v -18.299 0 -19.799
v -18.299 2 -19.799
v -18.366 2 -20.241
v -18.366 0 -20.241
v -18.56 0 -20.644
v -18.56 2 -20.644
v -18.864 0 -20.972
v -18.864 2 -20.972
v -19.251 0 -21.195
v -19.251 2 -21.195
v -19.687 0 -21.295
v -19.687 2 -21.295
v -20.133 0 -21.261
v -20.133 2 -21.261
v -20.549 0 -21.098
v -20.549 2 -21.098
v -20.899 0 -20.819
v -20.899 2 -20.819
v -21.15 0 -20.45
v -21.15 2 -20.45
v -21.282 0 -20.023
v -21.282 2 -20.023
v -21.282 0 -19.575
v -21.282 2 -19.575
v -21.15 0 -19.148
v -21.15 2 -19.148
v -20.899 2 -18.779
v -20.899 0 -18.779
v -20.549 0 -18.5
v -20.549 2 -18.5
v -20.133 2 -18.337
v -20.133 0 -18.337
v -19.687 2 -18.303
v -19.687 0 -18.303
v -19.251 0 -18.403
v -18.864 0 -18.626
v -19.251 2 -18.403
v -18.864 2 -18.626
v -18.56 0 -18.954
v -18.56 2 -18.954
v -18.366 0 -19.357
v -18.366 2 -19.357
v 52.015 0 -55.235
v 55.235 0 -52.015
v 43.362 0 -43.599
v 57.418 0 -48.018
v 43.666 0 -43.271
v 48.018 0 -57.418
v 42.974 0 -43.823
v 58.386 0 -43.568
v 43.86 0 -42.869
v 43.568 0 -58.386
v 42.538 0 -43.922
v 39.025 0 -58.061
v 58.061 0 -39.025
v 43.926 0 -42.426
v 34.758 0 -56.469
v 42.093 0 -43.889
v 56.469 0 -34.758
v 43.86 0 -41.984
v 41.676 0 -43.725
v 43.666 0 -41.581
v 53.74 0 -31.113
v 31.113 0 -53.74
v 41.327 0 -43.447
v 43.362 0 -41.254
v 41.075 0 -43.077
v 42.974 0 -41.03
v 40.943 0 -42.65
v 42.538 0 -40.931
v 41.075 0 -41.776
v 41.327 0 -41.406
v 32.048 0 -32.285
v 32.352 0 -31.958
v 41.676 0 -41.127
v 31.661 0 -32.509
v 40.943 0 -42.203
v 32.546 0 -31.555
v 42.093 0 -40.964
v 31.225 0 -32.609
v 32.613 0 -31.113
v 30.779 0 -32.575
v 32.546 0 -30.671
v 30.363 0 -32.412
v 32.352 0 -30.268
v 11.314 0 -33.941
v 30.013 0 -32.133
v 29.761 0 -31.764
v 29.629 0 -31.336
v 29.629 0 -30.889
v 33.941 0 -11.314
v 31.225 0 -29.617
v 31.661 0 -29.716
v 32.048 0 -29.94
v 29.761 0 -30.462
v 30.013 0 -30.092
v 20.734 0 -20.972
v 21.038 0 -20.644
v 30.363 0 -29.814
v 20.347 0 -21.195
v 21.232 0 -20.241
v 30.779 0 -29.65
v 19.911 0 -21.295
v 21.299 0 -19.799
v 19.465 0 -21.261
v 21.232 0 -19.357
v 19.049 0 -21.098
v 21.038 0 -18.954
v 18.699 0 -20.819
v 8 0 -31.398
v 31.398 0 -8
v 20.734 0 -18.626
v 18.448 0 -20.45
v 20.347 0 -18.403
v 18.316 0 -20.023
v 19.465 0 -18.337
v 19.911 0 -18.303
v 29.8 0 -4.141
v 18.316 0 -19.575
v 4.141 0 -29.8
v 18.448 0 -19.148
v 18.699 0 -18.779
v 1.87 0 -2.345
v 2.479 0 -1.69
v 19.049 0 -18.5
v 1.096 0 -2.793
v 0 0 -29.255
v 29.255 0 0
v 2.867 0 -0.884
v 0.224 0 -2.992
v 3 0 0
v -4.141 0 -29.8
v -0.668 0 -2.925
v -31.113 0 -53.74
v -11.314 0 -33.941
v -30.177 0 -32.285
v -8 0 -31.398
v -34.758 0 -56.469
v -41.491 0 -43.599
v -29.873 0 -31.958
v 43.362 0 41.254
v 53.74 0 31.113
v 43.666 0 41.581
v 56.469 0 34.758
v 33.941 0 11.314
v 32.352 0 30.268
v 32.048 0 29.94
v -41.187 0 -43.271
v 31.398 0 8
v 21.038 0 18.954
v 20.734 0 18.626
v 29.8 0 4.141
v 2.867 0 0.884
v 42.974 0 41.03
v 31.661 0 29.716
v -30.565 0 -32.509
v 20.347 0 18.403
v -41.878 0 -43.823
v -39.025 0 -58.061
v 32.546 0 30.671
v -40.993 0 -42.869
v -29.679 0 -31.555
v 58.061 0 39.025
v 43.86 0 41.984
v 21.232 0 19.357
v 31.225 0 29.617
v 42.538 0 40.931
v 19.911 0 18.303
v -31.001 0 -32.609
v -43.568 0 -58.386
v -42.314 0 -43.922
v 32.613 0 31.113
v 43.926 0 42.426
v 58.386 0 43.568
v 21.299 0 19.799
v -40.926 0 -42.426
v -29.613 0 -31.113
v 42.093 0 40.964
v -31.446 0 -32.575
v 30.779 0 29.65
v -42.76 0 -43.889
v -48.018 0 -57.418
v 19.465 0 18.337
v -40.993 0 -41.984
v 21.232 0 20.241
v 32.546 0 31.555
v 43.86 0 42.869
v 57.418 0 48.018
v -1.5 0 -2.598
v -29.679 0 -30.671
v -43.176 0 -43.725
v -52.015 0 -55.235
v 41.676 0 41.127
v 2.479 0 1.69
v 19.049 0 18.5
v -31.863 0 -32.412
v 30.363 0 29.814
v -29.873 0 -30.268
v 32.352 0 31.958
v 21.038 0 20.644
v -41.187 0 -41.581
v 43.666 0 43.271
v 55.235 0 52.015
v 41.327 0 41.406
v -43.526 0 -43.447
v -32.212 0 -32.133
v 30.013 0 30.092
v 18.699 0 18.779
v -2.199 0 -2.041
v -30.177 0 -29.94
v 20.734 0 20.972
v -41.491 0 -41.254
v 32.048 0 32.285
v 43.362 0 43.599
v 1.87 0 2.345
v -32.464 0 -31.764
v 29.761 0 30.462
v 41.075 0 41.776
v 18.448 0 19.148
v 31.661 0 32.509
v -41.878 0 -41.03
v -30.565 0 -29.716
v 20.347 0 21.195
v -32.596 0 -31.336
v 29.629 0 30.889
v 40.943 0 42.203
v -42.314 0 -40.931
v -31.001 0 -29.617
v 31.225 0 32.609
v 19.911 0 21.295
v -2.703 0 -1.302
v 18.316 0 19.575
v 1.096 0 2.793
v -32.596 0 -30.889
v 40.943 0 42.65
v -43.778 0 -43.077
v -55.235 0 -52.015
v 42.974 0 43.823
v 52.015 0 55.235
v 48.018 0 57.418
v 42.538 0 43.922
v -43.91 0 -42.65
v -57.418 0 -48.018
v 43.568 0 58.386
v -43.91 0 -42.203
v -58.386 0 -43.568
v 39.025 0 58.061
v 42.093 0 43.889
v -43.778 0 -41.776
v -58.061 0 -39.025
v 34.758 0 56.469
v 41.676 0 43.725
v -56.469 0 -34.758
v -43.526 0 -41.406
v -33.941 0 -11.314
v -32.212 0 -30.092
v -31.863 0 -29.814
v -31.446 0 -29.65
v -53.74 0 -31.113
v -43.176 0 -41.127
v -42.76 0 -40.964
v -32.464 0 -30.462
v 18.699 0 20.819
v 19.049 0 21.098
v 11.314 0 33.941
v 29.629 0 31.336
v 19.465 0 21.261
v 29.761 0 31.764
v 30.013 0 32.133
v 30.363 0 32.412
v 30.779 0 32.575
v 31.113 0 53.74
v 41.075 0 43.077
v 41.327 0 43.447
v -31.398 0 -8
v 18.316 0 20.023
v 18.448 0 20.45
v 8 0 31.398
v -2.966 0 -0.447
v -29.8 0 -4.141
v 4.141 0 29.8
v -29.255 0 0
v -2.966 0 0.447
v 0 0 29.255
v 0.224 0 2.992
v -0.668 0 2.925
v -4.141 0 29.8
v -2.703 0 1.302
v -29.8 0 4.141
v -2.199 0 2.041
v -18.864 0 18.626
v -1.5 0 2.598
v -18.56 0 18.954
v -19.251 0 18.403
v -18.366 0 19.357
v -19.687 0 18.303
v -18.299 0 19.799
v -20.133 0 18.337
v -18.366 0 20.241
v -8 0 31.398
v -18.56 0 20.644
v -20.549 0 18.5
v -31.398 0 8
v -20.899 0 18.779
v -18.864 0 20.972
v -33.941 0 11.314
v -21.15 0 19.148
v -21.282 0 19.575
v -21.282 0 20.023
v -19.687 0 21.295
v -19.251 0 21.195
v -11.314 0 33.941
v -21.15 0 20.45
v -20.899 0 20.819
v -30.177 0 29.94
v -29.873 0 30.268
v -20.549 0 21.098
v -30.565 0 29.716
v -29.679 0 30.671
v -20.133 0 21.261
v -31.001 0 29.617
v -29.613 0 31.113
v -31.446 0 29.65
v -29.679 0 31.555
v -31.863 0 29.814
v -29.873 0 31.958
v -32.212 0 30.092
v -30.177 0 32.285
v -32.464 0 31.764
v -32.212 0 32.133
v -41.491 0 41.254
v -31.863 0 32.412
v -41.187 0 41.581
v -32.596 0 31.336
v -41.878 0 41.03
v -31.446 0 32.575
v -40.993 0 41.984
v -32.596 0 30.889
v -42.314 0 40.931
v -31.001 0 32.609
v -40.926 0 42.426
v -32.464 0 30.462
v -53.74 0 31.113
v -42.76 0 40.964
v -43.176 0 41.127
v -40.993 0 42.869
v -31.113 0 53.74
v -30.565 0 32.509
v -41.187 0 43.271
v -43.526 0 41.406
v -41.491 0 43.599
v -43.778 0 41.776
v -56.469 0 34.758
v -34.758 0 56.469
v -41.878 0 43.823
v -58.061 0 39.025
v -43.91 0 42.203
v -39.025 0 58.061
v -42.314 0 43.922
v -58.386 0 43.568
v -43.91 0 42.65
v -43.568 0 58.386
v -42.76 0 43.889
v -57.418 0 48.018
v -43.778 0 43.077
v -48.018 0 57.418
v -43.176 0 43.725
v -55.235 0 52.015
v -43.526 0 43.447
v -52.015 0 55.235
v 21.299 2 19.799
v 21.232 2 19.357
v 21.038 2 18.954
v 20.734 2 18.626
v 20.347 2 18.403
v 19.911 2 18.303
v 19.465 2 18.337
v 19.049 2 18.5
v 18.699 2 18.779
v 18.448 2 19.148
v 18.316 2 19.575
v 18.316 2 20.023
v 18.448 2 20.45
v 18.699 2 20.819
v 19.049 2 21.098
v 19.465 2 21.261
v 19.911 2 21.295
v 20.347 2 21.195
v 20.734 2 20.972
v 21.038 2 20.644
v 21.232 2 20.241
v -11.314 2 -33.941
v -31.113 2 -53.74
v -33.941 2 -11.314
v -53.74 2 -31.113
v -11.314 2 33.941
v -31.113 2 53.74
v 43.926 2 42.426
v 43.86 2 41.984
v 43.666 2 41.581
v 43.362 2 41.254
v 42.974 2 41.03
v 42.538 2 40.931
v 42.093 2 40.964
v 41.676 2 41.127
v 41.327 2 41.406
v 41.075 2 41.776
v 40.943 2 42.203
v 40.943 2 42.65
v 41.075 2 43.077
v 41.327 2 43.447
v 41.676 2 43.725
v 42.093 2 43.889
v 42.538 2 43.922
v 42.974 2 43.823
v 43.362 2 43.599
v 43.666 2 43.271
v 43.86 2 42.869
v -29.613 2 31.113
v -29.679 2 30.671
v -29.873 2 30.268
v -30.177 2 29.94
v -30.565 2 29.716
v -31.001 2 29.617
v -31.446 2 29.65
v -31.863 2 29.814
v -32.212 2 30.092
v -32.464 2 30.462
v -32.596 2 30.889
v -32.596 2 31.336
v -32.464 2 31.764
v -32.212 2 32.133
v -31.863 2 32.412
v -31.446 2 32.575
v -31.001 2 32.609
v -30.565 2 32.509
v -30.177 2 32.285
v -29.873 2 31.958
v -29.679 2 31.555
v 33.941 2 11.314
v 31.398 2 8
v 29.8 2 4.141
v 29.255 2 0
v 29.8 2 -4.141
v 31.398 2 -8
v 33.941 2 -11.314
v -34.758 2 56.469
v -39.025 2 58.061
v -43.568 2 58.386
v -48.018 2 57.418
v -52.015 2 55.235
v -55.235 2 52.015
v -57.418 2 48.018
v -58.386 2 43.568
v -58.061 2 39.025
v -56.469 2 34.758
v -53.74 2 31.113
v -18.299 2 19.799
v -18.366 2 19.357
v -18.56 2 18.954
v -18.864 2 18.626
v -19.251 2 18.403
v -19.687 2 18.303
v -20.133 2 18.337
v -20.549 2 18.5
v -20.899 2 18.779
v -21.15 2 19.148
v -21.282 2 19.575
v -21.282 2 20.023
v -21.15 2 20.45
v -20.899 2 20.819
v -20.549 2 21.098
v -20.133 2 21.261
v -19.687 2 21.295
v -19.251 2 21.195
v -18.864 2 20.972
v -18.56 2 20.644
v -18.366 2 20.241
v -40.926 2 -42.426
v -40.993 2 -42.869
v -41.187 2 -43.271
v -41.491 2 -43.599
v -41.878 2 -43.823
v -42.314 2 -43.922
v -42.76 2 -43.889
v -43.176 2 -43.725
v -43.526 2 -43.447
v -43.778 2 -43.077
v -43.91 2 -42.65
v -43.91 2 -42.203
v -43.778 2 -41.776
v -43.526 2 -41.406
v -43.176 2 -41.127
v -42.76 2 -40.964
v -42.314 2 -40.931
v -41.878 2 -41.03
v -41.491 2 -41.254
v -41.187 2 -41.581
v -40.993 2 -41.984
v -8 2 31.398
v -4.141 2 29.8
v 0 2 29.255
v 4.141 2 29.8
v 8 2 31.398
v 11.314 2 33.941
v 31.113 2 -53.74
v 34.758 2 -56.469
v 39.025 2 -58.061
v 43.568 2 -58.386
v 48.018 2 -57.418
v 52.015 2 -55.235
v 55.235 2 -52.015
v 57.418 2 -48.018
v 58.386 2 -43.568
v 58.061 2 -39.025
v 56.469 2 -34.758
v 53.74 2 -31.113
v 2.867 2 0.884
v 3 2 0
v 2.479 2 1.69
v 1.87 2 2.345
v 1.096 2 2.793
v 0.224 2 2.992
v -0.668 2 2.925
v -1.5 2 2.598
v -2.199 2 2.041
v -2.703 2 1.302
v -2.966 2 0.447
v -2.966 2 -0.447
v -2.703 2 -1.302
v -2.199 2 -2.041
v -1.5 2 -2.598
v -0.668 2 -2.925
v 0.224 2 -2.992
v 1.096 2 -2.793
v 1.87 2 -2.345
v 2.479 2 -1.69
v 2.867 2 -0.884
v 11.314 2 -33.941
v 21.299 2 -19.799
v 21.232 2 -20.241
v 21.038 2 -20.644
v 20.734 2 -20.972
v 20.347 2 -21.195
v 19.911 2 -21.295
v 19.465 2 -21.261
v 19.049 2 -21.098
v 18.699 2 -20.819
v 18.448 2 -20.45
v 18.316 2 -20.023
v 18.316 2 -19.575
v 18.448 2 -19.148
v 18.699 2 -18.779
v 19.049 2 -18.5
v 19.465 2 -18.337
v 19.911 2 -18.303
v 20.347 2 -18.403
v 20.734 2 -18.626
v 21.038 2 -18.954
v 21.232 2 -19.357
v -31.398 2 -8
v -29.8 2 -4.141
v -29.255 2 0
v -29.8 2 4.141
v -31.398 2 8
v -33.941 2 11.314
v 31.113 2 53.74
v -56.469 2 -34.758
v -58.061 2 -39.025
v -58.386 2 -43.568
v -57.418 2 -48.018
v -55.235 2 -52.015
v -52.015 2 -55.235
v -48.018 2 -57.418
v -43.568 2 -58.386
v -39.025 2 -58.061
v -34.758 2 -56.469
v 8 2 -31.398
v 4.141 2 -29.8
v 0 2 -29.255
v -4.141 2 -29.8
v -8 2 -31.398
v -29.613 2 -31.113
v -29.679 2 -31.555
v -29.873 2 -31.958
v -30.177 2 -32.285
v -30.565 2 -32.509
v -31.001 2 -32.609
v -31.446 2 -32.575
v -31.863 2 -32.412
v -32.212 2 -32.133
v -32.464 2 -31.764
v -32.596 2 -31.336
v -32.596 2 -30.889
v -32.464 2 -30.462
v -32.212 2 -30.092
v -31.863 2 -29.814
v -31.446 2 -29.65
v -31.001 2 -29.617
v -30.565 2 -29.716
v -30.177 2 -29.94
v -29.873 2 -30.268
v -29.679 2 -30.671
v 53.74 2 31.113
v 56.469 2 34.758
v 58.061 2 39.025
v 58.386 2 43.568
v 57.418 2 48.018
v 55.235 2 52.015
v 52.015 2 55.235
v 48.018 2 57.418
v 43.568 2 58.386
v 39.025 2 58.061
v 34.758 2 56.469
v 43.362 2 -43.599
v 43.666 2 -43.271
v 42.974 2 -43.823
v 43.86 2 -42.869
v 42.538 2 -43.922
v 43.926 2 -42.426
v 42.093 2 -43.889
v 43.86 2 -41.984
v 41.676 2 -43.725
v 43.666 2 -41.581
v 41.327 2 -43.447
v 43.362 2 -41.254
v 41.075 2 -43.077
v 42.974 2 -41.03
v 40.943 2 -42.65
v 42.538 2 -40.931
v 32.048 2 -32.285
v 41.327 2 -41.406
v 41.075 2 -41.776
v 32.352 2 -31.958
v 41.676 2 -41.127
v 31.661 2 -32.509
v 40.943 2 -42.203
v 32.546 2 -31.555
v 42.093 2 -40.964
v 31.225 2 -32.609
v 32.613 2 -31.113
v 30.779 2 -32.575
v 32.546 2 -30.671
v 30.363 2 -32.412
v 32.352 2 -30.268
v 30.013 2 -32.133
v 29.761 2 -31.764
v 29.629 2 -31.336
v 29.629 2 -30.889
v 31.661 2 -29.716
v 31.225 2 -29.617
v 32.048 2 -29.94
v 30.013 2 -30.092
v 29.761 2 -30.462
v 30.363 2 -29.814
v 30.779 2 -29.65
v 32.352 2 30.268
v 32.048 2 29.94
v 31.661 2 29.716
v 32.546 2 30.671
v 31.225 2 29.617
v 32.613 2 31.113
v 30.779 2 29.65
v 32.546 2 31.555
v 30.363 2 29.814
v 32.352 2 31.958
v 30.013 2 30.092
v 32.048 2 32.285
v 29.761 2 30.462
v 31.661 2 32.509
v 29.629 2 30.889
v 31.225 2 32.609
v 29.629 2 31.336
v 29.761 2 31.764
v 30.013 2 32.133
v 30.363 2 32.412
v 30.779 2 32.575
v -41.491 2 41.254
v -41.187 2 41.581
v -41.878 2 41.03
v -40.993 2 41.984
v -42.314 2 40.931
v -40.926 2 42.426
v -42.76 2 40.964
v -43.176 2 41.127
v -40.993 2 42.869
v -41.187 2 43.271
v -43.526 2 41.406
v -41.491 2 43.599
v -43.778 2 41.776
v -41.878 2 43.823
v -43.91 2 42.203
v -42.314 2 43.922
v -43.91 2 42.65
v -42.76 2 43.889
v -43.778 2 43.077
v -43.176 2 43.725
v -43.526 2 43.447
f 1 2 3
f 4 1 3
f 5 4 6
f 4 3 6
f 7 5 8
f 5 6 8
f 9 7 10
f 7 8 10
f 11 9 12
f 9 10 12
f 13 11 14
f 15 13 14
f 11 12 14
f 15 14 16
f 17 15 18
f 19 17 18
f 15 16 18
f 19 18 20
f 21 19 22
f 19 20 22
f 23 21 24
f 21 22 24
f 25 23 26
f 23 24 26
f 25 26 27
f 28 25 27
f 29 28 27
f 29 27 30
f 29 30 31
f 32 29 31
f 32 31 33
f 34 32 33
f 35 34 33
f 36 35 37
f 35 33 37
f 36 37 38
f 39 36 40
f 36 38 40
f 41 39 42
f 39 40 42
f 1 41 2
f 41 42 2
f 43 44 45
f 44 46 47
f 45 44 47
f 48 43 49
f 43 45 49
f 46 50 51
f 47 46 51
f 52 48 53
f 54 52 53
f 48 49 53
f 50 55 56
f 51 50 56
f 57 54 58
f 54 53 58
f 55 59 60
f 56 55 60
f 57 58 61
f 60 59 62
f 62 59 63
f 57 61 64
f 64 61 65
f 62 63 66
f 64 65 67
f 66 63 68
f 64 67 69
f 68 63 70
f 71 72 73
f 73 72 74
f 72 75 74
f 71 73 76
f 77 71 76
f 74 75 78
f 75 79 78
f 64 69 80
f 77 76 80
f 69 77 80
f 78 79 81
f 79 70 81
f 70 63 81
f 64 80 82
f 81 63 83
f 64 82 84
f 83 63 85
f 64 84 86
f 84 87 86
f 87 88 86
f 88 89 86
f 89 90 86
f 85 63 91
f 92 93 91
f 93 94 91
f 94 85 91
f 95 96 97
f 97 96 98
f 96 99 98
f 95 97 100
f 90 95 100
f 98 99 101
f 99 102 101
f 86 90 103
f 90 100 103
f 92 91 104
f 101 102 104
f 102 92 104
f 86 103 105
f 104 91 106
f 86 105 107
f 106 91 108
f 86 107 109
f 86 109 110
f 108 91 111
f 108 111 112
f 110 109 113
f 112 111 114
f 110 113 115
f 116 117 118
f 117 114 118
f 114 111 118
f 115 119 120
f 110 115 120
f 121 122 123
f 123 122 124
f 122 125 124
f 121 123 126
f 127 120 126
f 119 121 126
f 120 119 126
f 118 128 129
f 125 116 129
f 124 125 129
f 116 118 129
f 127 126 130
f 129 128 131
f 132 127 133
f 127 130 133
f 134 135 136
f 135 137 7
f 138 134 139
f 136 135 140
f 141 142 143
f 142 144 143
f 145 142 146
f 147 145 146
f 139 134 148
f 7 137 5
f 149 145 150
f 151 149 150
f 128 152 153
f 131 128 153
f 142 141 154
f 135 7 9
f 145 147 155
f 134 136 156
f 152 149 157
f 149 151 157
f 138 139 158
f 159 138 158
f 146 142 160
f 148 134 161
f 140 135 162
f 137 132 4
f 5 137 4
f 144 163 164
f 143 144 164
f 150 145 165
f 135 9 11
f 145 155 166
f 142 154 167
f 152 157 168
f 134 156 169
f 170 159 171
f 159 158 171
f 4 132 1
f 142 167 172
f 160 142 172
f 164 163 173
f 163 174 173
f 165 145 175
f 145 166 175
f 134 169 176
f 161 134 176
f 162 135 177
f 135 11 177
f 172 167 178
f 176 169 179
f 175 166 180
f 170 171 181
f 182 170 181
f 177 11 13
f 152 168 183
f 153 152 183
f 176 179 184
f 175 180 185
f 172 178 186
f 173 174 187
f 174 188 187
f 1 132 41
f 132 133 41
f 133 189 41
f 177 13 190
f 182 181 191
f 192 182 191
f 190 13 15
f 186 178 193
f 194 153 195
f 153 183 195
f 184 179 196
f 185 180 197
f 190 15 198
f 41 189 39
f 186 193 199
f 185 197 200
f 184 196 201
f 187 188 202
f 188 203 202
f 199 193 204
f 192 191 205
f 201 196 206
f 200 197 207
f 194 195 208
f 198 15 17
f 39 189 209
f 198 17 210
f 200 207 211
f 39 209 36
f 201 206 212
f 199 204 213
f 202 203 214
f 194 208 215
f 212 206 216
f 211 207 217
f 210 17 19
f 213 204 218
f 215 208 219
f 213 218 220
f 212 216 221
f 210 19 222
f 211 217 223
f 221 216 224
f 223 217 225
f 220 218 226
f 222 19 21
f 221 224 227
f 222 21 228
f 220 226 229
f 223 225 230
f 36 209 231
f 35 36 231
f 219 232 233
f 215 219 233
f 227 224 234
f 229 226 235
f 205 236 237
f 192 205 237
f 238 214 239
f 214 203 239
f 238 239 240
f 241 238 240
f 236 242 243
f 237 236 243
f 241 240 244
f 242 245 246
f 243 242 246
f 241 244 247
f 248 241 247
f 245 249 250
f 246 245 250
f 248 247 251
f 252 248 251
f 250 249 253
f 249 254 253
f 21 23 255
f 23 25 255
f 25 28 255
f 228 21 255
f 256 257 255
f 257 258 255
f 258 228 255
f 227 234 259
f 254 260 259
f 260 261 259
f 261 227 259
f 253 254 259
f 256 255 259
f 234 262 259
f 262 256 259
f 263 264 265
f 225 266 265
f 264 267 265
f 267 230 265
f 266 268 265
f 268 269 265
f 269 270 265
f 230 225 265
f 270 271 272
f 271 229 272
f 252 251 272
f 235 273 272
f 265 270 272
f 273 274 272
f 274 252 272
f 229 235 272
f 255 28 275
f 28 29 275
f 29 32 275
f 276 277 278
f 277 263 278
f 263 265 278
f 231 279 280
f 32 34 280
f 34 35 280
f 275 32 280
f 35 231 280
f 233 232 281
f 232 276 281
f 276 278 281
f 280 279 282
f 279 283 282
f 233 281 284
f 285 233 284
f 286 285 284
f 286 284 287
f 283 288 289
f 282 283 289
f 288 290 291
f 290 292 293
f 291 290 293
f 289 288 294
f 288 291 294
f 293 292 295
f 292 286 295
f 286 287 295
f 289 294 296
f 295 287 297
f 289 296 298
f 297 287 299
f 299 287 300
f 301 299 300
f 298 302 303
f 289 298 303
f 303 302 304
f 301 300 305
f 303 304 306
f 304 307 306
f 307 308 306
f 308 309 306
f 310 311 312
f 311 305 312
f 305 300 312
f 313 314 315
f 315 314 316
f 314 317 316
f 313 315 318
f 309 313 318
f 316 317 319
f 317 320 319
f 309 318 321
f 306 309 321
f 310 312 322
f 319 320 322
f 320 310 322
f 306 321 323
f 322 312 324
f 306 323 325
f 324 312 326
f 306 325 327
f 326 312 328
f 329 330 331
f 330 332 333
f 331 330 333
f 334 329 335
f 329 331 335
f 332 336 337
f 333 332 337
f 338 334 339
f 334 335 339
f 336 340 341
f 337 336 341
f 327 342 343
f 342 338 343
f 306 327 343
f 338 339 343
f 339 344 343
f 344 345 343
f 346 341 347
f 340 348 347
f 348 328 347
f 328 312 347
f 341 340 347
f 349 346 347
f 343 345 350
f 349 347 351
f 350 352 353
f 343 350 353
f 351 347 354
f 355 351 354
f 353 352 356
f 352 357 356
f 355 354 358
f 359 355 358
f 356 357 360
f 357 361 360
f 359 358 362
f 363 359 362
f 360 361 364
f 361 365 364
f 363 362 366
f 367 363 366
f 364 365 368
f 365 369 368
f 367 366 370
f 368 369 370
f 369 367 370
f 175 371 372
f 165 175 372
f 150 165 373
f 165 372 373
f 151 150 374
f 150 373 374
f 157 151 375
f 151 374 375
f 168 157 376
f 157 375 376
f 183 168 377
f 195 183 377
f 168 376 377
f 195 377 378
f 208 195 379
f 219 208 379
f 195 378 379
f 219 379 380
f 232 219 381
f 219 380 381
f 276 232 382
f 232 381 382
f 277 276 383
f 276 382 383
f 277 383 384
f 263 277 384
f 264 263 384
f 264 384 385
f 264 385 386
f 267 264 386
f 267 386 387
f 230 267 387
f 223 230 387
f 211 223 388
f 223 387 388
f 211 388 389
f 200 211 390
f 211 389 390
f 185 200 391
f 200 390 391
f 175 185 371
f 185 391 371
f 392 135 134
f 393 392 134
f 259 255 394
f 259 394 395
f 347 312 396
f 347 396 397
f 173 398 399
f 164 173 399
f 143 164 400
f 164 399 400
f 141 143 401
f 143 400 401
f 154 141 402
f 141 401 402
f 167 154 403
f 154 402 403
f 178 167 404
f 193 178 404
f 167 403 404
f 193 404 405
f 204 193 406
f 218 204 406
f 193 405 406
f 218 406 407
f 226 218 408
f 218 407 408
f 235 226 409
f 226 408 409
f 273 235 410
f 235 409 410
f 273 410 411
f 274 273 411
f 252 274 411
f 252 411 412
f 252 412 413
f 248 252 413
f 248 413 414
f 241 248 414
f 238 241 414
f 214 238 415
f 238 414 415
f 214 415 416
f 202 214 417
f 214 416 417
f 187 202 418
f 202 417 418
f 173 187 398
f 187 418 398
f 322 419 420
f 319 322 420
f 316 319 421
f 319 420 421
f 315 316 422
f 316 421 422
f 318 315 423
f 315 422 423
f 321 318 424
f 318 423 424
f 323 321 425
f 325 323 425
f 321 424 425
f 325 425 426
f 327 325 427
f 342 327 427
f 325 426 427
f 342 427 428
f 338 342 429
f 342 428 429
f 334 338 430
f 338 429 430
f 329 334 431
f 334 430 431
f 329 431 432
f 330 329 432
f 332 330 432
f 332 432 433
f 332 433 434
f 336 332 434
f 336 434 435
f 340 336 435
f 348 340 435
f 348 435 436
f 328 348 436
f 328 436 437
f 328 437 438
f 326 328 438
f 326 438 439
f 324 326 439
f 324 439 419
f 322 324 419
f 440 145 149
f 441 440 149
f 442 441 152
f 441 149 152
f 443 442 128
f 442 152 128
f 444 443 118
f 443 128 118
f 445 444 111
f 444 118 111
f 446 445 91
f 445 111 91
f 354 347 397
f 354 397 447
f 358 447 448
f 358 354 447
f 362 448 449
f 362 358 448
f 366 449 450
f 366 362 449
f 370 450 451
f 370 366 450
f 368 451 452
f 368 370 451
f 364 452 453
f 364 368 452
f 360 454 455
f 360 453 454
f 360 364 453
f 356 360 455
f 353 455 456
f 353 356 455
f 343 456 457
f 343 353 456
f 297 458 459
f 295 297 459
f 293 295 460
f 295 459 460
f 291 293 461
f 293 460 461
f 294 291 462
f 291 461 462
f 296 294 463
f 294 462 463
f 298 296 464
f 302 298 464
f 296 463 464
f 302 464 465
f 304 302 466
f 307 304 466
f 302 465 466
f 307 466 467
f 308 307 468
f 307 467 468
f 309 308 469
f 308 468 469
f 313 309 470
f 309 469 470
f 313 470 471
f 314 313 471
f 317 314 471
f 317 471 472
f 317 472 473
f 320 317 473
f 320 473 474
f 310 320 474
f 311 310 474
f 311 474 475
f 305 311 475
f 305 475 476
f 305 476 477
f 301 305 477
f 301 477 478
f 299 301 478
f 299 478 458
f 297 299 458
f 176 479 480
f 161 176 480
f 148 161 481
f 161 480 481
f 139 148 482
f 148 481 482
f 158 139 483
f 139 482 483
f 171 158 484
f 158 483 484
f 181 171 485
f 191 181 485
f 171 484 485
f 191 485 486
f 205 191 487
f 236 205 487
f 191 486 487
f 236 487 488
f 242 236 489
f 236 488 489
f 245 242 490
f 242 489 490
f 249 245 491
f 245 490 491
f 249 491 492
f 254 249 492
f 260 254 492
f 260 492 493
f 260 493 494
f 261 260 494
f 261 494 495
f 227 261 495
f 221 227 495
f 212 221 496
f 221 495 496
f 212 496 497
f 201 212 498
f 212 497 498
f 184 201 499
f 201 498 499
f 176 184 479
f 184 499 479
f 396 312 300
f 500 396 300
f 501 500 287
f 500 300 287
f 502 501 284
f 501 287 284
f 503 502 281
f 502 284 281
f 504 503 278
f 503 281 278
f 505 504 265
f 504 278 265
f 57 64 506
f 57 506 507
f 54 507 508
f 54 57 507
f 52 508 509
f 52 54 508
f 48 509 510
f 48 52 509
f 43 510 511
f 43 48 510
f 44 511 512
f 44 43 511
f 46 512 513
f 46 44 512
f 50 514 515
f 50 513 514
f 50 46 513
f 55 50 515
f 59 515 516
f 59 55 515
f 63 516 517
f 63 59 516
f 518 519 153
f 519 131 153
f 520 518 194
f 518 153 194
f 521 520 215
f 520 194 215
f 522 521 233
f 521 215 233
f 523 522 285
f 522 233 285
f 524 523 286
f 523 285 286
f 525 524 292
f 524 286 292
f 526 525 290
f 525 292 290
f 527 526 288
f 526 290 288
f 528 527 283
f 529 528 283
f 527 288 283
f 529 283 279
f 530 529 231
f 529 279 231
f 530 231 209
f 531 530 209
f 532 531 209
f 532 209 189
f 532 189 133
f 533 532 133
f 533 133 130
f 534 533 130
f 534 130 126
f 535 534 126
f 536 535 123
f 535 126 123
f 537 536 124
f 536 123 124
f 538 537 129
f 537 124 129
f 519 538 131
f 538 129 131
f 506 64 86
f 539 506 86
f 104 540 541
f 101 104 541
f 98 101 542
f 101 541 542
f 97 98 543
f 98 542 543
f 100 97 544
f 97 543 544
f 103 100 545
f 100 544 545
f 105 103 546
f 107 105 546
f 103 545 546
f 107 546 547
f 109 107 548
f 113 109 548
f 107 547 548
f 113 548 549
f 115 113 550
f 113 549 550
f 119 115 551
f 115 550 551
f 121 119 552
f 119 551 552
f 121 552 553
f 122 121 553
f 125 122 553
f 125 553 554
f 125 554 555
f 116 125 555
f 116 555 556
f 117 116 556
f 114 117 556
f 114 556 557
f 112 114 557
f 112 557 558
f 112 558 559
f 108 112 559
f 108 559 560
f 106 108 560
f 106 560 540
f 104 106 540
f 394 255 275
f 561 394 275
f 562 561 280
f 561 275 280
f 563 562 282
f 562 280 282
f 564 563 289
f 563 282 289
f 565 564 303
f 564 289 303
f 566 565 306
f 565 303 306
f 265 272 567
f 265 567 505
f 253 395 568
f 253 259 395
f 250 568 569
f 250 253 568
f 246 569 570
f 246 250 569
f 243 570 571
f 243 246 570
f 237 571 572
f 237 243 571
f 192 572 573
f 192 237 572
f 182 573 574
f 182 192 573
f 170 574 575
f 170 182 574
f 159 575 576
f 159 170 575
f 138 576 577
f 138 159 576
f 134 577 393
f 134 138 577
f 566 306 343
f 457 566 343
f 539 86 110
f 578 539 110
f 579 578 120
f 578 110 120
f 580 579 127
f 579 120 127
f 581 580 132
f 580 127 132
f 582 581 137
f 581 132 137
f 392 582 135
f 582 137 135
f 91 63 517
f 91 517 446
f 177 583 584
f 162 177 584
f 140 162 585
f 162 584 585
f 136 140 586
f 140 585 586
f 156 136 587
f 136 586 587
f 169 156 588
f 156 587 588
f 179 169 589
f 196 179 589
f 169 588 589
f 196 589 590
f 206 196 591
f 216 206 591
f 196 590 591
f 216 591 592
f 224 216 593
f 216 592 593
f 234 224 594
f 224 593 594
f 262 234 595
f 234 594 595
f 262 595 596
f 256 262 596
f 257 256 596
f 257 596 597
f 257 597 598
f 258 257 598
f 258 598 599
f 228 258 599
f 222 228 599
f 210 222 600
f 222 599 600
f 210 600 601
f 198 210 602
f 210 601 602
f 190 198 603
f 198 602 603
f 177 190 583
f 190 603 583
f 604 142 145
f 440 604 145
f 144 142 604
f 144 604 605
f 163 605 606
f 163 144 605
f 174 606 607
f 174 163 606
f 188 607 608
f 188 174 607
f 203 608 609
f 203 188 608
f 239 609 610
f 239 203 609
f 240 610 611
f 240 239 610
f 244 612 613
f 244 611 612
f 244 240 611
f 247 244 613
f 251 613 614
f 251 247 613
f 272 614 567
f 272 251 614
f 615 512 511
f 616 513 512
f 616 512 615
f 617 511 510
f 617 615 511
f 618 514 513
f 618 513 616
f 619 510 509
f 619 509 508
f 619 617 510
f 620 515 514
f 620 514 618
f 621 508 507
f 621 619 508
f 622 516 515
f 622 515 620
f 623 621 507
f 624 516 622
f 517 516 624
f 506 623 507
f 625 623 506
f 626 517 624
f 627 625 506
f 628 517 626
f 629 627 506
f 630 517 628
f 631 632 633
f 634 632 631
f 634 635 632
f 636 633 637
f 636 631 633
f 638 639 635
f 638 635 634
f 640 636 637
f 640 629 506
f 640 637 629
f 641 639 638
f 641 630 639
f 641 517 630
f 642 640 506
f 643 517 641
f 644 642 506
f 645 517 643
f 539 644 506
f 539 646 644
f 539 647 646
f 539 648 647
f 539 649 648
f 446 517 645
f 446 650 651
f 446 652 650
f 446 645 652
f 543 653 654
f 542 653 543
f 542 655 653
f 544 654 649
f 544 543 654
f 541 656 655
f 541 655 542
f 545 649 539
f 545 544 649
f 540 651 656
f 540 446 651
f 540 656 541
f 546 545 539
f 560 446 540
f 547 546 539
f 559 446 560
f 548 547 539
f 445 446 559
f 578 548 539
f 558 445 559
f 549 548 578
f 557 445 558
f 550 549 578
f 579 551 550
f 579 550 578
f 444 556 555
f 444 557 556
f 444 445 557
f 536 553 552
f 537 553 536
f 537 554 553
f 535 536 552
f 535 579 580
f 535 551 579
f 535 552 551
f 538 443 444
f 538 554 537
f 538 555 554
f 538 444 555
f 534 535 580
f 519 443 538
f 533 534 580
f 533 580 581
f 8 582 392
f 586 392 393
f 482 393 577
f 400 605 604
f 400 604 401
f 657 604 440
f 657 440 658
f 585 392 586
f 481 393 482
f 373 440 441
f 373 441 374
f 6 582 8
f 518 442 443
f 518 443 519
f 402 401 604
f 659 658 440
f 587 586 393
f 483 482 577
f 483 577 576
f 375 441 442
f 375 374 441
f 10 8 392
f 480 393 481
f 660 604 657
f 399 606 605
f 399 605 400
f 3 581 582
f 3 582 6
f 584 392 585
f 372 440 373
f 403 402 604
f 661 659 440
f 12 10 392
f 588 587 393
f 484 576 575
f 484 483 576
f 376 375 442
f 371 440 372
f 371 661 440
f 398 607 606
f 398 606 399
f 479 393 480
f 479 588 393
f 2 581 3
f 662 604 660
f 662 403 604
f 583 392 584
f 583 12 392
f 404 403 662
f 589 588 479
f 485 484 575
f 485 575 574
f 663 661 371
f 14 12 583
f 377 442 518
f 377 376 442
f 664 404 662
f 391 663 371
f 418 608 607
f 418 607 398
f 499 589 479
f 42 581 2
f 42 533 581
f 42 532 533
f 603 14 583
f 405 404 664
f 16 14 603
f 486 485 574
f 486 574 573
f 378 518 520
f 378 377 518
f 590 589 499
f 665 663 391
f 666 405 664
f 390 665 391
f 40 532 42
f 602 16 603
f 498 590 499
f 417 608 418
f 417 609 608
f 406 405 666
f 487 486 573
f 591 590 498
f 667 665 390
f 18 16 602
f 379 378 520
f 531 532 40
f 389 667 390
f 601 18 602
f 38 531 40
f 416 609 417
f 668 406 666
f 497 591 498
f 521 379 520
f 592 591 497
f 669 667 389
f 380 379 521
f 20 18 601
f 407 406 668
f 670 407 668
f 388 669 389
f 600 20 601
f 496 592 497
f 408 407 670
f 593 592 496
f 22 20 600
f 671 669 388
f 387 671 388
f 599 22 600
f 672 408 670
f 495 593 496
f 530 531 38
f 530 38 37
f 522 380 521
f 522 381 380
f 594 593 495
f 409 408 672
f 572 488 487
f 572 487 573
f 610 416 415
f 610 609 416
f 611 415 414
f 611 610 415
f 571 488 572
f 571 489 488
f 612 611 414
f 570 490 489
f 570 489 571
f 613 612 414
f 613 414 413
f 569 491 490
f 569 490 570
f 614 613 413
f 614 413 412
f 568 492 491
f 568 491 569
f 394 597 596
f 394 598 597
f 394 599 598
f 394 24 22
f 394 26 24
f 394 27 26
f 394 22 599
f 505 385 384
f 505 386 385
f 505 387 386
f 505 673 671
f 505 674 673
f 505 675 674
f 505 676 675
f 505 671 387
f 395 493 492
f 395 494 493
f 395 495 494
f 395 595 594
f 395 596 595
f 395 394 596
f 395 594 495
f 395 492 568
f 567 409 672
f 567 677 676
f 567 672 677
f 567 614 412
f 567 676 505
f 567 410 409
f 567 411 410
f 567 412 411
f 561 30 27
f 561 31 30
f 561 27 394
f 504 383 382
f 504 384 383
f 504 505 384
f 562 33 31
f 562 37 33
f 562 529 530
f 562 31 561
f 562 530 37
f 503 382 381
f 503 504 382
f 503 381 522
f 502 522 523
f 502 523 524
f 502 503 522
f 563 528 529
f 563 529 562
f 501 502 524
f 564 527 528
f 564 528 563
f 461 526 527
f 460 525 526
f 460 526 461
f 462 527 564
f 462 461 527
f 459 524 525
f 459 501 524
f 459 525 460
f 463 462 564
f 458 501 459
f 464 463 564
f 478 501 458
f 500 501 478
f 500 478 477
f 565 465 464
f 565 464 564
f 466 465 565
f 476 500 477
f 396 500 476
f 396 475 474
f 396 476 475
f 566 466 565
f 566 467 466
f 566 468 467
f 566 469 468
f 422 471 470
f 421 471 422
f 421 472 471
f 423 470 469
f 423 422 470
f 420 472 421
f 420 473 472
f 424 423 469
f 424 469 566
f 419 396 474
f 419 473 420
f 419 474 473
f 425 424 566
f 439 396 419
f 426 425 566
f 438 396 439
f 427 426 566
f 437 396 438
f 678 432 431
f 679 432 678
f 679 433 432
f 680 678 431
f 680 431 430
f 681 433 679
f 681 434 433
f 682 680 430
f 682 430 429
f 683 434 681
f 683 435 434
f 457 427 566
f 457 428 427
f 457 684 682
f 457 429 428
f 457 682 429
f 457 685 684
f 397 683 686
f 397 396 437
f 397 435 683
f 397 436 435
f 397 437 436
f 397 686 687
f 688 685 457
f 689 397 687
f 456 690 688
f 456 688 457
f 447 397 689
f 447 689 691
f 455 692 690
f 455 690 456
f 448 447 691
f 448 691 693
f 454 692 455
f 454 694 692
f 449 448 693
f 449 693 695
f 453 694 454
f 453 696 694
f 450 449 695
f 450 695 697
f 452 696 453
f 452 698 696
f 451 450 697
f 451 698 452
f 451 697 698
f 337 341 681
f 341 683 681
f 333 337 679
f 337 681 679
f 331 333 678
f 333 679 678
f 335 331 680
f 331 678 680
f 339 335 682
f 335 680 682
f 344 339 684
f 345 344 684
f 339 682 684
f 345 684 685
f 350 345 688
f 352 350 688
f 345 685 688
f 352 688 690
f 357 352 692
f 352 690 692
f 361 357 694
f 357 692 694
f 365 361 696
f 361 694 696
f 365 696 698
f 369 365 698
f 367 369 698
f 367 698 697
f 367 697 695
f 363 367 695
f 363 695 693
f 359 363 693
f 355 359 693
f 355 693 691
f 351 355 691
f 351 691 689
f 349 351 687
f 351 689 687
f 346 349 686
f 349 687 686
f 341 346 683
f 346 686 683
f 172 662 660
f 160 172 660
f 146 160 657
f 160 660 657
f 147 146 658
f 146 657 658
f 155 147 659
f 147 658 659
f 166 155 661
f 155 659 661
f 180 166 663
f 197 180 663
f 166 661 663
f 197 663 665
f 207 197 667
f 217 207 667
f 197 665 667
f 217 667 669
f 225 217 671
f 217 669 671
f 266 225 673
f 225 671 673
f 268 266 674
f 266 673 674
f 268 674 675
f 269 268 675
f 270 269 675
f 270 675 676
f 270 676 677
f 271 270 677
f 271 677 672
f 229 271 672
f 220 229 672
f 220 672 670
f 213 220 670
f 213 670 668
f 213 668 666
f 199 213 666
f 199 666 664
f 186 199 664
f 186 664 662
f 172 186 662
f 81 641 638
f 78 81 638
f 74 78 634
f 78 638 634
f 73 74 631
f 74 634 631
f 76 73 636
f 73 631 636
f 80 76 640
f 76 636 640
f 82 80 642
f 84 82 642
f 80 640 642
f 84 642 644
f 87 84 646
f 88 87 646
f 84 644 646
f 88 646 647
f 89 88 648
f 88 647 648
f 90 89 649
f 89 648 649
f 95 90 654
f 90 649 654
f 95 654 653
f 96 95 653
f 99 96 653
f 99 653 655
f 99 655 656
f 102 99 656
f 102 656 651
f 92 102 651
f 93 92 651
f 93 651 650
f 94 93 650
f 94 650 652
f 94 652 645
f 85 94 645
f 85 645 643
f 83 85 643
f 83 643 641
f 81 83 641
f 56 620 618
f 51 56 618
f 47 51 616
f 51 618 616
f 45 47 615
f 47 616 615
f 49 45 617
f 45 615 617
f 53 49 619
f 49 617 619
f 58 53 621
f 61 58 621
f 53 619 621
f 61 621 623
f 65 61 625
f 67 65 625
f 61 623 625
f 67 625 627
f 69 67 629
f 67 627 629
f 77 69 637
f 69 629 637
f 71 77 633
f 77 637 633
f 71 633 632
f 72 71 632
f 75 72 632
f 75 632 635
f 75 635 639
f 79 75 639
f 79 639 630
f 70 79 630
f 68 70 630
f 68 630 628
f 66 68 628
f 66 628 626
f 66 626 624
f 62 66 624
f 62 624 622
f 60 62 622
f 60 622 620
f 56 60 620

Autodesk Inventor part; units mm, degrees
ref_plane "YZ Plane" through (0, 0, 0) normal (1, 0, 0) x (0, 1, 0)
ref_plane "XZ Plane" through (0, 0, 0) normal (0, 1, 0) x (-1, 0, 0)
ref_plane "XY Plane" through (0, 0, 0) normal (0, 0, 1) x (1, 0, 0)
sketch "Sketch1" plane through (0, 0, 0) normal (0, 1, 0) x (-1, 0, 0)
  arc A0 (-53.7401, -31.1127) -> (-31.1127, -53.7401) centre (-42.4264, -42.4264) ccw
  arc A1 (31.1127, -53.7401) -> (53.7401, -31.1127) centre (42.4264, -42.4264) ccw
  arc A2 (53.7401, 31.1127) -> (31.1127, 53.7401) centre (42.4264, 42.4264) ccw
  arc A3 (-31.1127, 53.7401) -> (-53.7401, 31.1127) centre (-42.4264, 42.4264) ccw
  line L0 (-53.7401, 31.1127) -> (-33.9411, 11.3137)
  line L1 (11.3137, -33.9411) -> (31.1127, -53.7401)
  line L2 (-53.7401, -31.1127) -> (-33.9411, -11.3137)
  line L3 (11.3137, 33.9411) -> (31.1127, 53.7401)
  line L4 (-31.1127, 53.7401) -> (-11.3137, 33.9411)
  line L5 (33.9411, -11.3137) -> (53.7401, -31.1127)
  line L6 (-31.1127, -53.7401) -> (-11.3137, -33.9411)
  line L7 (33.9411, 11.3137) -> (53.7401, 31.1127)
  arc A4 (11.3137, -33.9411) -> (-11.3137, -33.9411) centre (0, -45.2548) ccw
  arc A5 (33.9411, 11.3137) -> (33.9411, -11.3137) centre (45.2548, 0) ccw
  arc A6 (-11.3137, 33.9411) -> (11.3137, 33.9411) centre (0, 45.2548) ccw
  arc A7 (-33.9411, -11.3137) -> (-33.9411, 11.3137) centre (-45.2548, 0) ccw
  arc A8 (-53.7401, -31.1127) -> (-31.1127, -53.7401) centre (-42.4264, -42.4264) ccw
  arc A9 (31.1127, -53.7401) -> (53.7401, -31.1127) centre (42.4264, -42.4264) ccw
  arc A10 (53.7401, 31.1127) -> (31.1127, 53.7401) centre (42.4264, 42.4264) ccw
  arc A11 (-31.1127, 53.7401) -> (-53.7401, 31.1127) centre (-42.4264, 42.4264) ccw
  line L8 (-53.7401, 31.1127) -> (-33.9411, 11.3137)
  line L9 (11.3137, -33.9411) -> (31.1127, -53.7401)
  line L10 (-53.7401, -31.1127) -> (-33.9411, -11.3137)
  line L11 (11.3137, 33.9411) -> (31.1127, 53.7401)
  line L12 (-31.1127, 53.7401) -> (-11.3137, 33.9411)
  line L13 (33.9411, -11.3137) -> (53.7401, -31.1127)
  line L14 (-31.1127, -53.7401) -> (-11.3137, -33.9411)
  line L15 (33.9411, 11.3137) -> (53.7401, 31.1127)
  arc A12 (11.3137, -33.9411) -> (-11.3137, -33.9411) centre (0, -45.2548) ccw
  arc A13 (33.9411, 11.3137) -> (33.9411, -11.3137) centre (45.2548, 0) ccw
  arc A14 (-11.3137, 33.9411) -> (11.3137, 33.9411) centre (0, 45.2548) ccw
  arc A15 (-33.9411, -11.3137) -> (-33.9411, 11.3137) centre (-45.2548, 0) ccw
  arc A16 (-53.7401, -31.1127) -> (-31.1127, -53.7401) centre (-42.4264, -42.4264) ccw
  arc A17 (31.1127, -53.7401) -> (53.7401, -31.1127) centre (42.4264, -42.4264) ccw
  arc A18 (53.7401, 31.1127) -> (31.1127, 53.7401) centre (42.4264, 42.4264) ccw
  arc A19 (-31.1127, 53.7401) -> (-53.7401, 31.1127) centre (-42.4264, 42.4264) ccw
  line L16 (-53.7401, 31.1127) -> (-33.9411, 11.3137)
  line L17 (11.3137, -33.9411) -> (31.1127, -53.7401)
  line L18 (-53.7401, -31.1127) -> (-33.9411, -11.3137)
  line L19 (11.3137, 33.9411) -> (31.1127, 53.7401)
  line L20 (-31.1127, 53.7401) -> (-11.3137, 33.9411)
  line L21 (33.9411, -11.3137) -> (53.7401, -31.1127)
  line L22 (-31.1127, -53.7401) -> (-11.3137, -33.9411)
  line L23 (33.9411, 11.3137) -> (53.7401, 31.1127)
  arc A20 (11.3137, -33.9411) -> (-11.3137, -33.9411) centre (0, -45.2548) ccw
  arc A21 (33.9411, 11.3137) -> (33.9411, -11.3137) centre (45.2548, 0) ccw
  arc A22 (-11.3137, 33.9411) -> (11.3137, 33.9411) centre (0, 45.2548) ccw
  arc A23 (-33.9411, -11.3137) -> (-33.9411, 11.3137) centre (-45.2548, 0) ccw
  point P0 (0, 0)
  point P1 (0, 0)
  point P2 (0, 0)
  point P3 (0, 0)
  point P4 (0, 0)
  point P5 (0, 0)
  point P6 (0, 0)
extrude "Extrusion1" add sketch "Sketch1" along normal blind 2
sketch "Sketch2" plane through (0, 0, 0) normal (0, -1, 0) x (1, 0, 0)
  circle A0 centre (0, 0) radius 3
  dimension "d2" = 6
extrude "Extrusion2" cut sketch "Sketch2" against normal blind 30
sketch "Sketch3" plane through (0, 2, 0) normal (0, 1, 0) x (1, 0, 0)
  arc A0 (53.7401, 31.1127) -> (31.1127, 53.7401) centre (42.4264, 42.4264) ccw projected
  circle A1 centre (42.4264, 42.4264) radius 1.5
  arc A2 (-31.1127, 53.7401) -> (-53.7401, 31.1127) centre (-42.4264, 42.4264) ccw projected
  circle A3 centre (-42.4264, 42.4264) radius 1.5
  arc A4 (-53.7401, -31.1127) -> (-31.1127, -53.7401) centre (-42.4264, -42.4264) ccw projected
  circle A5 centre (-42.4264, -42.4264) radius 1.5
  arc A6 (31.1127, -53.7401) -> (53.7401, -31.1127) centre (42.4264, -42.4264) ccw projected
  circle A7 centre (42.4264, -42.4264) radius 1.5
  line L0 (0, 0) -> (28, 0) construction
  circle A8 centre (-19.799, 19.799) radius 1.5
  circle A9 centre (19.799, 19.799) radius 1.5
  circle A10 centre (19.799, -19.799) radius 1.5
  circle A11 centre (-19.799, -19.799) radius 1.5
  dimension "d5" = 3
  dimension "d6" = 3
  dimension "d7" = 3
  dimension "d8" = 3
  dimension "d11" = 3
  dimension "d12" = 3
  dimension "d13" = 3
  dimension "d14" = 3
extrude "Extrusion3" cut sketch "Sketch3" against normal blind 20
sketch "Sketch4" plane through (0, 2, 0) normal (0, 1, 0) x (1, 0, 0)
  line L0 (-7.4916, -30.1191) -> (-44.7907, -22.1777)
  line L1 (-8.9058, -31.5333) -> (-7.4916, -30.1191)
  line L2 (-44.7907, -22.1777) -> (-46.2121, -23.5847)
  line L3 (-7.4916, -30.1191) -> (-8.9058, -31.5333)
  line L4 (-8.9058, -31.5333) -> (-46.2121, -23.5847)
  line L5 (7.4916, 30.1191) -> (44.7907, 22.1777)
  line L6 (8.9058, 31.5333) -> (7.4916, 30.1191)
  line L7 (44.7907, 22.1777) -> (46.2121, 23.5847)
  line L8 (7.4916, 30.1191) -> (8.9058, 31.5333)
  line L9 (8.9058, 31.5333) -> (46.2121, 23.5847)
  line L10 (45.2798, -22.6524) -> (41.4801, -40.5283)
  line L11 (41.4801, -40.5283) -> (43.4364, -40.9441)
  line L12 (46.966, -24.3386) -> (43.4364, -40.9441)
  line L13 (46.966, -24.3386) -> (45.2798, -22.6524)
  line L14 (-45.2798, 22.6524) -> (-41.4801, 40.5283)
  line L15 (-46.966, 24.3386) -> (-45.2798, 22.6524)
  line L16 (-46.966, 24.3386) -> (-43.4364, 40.9441)
  line L17 (-41.4801, 40.5283) -> (-43.4364, 40.9441)
  point P0 (0, 0)
  dimension "d20" = 2
  dimension "d21" = 2
  dimension "d24" = 360
  dimension "d27" = 2
  dimension "d31" = 360
extrude "Extrusion4" [suppressed]
sketch "Sketch7" plane through (0, 2, 0) normal (0, 1, 0) x (1, 0, 0)
  line L0 (0, 0) -> (44, 0) construction
  circle A0 centre (31.1127, -31.1127) radius 1.5
  circle A1 centre (31.1127, 31.1127) radius 1.5
  circle A2 centre (-31.1127, 31.1127) radius 1.5
  circle A3 centre (-31.1127, -31.1127) radius 1.5
  dimension "d48" = 3
  dimension "d51" = 360
extrude "Extrusion7" cut sketch "Sketch7" against normal blind 10
properties part number "platform 1"
